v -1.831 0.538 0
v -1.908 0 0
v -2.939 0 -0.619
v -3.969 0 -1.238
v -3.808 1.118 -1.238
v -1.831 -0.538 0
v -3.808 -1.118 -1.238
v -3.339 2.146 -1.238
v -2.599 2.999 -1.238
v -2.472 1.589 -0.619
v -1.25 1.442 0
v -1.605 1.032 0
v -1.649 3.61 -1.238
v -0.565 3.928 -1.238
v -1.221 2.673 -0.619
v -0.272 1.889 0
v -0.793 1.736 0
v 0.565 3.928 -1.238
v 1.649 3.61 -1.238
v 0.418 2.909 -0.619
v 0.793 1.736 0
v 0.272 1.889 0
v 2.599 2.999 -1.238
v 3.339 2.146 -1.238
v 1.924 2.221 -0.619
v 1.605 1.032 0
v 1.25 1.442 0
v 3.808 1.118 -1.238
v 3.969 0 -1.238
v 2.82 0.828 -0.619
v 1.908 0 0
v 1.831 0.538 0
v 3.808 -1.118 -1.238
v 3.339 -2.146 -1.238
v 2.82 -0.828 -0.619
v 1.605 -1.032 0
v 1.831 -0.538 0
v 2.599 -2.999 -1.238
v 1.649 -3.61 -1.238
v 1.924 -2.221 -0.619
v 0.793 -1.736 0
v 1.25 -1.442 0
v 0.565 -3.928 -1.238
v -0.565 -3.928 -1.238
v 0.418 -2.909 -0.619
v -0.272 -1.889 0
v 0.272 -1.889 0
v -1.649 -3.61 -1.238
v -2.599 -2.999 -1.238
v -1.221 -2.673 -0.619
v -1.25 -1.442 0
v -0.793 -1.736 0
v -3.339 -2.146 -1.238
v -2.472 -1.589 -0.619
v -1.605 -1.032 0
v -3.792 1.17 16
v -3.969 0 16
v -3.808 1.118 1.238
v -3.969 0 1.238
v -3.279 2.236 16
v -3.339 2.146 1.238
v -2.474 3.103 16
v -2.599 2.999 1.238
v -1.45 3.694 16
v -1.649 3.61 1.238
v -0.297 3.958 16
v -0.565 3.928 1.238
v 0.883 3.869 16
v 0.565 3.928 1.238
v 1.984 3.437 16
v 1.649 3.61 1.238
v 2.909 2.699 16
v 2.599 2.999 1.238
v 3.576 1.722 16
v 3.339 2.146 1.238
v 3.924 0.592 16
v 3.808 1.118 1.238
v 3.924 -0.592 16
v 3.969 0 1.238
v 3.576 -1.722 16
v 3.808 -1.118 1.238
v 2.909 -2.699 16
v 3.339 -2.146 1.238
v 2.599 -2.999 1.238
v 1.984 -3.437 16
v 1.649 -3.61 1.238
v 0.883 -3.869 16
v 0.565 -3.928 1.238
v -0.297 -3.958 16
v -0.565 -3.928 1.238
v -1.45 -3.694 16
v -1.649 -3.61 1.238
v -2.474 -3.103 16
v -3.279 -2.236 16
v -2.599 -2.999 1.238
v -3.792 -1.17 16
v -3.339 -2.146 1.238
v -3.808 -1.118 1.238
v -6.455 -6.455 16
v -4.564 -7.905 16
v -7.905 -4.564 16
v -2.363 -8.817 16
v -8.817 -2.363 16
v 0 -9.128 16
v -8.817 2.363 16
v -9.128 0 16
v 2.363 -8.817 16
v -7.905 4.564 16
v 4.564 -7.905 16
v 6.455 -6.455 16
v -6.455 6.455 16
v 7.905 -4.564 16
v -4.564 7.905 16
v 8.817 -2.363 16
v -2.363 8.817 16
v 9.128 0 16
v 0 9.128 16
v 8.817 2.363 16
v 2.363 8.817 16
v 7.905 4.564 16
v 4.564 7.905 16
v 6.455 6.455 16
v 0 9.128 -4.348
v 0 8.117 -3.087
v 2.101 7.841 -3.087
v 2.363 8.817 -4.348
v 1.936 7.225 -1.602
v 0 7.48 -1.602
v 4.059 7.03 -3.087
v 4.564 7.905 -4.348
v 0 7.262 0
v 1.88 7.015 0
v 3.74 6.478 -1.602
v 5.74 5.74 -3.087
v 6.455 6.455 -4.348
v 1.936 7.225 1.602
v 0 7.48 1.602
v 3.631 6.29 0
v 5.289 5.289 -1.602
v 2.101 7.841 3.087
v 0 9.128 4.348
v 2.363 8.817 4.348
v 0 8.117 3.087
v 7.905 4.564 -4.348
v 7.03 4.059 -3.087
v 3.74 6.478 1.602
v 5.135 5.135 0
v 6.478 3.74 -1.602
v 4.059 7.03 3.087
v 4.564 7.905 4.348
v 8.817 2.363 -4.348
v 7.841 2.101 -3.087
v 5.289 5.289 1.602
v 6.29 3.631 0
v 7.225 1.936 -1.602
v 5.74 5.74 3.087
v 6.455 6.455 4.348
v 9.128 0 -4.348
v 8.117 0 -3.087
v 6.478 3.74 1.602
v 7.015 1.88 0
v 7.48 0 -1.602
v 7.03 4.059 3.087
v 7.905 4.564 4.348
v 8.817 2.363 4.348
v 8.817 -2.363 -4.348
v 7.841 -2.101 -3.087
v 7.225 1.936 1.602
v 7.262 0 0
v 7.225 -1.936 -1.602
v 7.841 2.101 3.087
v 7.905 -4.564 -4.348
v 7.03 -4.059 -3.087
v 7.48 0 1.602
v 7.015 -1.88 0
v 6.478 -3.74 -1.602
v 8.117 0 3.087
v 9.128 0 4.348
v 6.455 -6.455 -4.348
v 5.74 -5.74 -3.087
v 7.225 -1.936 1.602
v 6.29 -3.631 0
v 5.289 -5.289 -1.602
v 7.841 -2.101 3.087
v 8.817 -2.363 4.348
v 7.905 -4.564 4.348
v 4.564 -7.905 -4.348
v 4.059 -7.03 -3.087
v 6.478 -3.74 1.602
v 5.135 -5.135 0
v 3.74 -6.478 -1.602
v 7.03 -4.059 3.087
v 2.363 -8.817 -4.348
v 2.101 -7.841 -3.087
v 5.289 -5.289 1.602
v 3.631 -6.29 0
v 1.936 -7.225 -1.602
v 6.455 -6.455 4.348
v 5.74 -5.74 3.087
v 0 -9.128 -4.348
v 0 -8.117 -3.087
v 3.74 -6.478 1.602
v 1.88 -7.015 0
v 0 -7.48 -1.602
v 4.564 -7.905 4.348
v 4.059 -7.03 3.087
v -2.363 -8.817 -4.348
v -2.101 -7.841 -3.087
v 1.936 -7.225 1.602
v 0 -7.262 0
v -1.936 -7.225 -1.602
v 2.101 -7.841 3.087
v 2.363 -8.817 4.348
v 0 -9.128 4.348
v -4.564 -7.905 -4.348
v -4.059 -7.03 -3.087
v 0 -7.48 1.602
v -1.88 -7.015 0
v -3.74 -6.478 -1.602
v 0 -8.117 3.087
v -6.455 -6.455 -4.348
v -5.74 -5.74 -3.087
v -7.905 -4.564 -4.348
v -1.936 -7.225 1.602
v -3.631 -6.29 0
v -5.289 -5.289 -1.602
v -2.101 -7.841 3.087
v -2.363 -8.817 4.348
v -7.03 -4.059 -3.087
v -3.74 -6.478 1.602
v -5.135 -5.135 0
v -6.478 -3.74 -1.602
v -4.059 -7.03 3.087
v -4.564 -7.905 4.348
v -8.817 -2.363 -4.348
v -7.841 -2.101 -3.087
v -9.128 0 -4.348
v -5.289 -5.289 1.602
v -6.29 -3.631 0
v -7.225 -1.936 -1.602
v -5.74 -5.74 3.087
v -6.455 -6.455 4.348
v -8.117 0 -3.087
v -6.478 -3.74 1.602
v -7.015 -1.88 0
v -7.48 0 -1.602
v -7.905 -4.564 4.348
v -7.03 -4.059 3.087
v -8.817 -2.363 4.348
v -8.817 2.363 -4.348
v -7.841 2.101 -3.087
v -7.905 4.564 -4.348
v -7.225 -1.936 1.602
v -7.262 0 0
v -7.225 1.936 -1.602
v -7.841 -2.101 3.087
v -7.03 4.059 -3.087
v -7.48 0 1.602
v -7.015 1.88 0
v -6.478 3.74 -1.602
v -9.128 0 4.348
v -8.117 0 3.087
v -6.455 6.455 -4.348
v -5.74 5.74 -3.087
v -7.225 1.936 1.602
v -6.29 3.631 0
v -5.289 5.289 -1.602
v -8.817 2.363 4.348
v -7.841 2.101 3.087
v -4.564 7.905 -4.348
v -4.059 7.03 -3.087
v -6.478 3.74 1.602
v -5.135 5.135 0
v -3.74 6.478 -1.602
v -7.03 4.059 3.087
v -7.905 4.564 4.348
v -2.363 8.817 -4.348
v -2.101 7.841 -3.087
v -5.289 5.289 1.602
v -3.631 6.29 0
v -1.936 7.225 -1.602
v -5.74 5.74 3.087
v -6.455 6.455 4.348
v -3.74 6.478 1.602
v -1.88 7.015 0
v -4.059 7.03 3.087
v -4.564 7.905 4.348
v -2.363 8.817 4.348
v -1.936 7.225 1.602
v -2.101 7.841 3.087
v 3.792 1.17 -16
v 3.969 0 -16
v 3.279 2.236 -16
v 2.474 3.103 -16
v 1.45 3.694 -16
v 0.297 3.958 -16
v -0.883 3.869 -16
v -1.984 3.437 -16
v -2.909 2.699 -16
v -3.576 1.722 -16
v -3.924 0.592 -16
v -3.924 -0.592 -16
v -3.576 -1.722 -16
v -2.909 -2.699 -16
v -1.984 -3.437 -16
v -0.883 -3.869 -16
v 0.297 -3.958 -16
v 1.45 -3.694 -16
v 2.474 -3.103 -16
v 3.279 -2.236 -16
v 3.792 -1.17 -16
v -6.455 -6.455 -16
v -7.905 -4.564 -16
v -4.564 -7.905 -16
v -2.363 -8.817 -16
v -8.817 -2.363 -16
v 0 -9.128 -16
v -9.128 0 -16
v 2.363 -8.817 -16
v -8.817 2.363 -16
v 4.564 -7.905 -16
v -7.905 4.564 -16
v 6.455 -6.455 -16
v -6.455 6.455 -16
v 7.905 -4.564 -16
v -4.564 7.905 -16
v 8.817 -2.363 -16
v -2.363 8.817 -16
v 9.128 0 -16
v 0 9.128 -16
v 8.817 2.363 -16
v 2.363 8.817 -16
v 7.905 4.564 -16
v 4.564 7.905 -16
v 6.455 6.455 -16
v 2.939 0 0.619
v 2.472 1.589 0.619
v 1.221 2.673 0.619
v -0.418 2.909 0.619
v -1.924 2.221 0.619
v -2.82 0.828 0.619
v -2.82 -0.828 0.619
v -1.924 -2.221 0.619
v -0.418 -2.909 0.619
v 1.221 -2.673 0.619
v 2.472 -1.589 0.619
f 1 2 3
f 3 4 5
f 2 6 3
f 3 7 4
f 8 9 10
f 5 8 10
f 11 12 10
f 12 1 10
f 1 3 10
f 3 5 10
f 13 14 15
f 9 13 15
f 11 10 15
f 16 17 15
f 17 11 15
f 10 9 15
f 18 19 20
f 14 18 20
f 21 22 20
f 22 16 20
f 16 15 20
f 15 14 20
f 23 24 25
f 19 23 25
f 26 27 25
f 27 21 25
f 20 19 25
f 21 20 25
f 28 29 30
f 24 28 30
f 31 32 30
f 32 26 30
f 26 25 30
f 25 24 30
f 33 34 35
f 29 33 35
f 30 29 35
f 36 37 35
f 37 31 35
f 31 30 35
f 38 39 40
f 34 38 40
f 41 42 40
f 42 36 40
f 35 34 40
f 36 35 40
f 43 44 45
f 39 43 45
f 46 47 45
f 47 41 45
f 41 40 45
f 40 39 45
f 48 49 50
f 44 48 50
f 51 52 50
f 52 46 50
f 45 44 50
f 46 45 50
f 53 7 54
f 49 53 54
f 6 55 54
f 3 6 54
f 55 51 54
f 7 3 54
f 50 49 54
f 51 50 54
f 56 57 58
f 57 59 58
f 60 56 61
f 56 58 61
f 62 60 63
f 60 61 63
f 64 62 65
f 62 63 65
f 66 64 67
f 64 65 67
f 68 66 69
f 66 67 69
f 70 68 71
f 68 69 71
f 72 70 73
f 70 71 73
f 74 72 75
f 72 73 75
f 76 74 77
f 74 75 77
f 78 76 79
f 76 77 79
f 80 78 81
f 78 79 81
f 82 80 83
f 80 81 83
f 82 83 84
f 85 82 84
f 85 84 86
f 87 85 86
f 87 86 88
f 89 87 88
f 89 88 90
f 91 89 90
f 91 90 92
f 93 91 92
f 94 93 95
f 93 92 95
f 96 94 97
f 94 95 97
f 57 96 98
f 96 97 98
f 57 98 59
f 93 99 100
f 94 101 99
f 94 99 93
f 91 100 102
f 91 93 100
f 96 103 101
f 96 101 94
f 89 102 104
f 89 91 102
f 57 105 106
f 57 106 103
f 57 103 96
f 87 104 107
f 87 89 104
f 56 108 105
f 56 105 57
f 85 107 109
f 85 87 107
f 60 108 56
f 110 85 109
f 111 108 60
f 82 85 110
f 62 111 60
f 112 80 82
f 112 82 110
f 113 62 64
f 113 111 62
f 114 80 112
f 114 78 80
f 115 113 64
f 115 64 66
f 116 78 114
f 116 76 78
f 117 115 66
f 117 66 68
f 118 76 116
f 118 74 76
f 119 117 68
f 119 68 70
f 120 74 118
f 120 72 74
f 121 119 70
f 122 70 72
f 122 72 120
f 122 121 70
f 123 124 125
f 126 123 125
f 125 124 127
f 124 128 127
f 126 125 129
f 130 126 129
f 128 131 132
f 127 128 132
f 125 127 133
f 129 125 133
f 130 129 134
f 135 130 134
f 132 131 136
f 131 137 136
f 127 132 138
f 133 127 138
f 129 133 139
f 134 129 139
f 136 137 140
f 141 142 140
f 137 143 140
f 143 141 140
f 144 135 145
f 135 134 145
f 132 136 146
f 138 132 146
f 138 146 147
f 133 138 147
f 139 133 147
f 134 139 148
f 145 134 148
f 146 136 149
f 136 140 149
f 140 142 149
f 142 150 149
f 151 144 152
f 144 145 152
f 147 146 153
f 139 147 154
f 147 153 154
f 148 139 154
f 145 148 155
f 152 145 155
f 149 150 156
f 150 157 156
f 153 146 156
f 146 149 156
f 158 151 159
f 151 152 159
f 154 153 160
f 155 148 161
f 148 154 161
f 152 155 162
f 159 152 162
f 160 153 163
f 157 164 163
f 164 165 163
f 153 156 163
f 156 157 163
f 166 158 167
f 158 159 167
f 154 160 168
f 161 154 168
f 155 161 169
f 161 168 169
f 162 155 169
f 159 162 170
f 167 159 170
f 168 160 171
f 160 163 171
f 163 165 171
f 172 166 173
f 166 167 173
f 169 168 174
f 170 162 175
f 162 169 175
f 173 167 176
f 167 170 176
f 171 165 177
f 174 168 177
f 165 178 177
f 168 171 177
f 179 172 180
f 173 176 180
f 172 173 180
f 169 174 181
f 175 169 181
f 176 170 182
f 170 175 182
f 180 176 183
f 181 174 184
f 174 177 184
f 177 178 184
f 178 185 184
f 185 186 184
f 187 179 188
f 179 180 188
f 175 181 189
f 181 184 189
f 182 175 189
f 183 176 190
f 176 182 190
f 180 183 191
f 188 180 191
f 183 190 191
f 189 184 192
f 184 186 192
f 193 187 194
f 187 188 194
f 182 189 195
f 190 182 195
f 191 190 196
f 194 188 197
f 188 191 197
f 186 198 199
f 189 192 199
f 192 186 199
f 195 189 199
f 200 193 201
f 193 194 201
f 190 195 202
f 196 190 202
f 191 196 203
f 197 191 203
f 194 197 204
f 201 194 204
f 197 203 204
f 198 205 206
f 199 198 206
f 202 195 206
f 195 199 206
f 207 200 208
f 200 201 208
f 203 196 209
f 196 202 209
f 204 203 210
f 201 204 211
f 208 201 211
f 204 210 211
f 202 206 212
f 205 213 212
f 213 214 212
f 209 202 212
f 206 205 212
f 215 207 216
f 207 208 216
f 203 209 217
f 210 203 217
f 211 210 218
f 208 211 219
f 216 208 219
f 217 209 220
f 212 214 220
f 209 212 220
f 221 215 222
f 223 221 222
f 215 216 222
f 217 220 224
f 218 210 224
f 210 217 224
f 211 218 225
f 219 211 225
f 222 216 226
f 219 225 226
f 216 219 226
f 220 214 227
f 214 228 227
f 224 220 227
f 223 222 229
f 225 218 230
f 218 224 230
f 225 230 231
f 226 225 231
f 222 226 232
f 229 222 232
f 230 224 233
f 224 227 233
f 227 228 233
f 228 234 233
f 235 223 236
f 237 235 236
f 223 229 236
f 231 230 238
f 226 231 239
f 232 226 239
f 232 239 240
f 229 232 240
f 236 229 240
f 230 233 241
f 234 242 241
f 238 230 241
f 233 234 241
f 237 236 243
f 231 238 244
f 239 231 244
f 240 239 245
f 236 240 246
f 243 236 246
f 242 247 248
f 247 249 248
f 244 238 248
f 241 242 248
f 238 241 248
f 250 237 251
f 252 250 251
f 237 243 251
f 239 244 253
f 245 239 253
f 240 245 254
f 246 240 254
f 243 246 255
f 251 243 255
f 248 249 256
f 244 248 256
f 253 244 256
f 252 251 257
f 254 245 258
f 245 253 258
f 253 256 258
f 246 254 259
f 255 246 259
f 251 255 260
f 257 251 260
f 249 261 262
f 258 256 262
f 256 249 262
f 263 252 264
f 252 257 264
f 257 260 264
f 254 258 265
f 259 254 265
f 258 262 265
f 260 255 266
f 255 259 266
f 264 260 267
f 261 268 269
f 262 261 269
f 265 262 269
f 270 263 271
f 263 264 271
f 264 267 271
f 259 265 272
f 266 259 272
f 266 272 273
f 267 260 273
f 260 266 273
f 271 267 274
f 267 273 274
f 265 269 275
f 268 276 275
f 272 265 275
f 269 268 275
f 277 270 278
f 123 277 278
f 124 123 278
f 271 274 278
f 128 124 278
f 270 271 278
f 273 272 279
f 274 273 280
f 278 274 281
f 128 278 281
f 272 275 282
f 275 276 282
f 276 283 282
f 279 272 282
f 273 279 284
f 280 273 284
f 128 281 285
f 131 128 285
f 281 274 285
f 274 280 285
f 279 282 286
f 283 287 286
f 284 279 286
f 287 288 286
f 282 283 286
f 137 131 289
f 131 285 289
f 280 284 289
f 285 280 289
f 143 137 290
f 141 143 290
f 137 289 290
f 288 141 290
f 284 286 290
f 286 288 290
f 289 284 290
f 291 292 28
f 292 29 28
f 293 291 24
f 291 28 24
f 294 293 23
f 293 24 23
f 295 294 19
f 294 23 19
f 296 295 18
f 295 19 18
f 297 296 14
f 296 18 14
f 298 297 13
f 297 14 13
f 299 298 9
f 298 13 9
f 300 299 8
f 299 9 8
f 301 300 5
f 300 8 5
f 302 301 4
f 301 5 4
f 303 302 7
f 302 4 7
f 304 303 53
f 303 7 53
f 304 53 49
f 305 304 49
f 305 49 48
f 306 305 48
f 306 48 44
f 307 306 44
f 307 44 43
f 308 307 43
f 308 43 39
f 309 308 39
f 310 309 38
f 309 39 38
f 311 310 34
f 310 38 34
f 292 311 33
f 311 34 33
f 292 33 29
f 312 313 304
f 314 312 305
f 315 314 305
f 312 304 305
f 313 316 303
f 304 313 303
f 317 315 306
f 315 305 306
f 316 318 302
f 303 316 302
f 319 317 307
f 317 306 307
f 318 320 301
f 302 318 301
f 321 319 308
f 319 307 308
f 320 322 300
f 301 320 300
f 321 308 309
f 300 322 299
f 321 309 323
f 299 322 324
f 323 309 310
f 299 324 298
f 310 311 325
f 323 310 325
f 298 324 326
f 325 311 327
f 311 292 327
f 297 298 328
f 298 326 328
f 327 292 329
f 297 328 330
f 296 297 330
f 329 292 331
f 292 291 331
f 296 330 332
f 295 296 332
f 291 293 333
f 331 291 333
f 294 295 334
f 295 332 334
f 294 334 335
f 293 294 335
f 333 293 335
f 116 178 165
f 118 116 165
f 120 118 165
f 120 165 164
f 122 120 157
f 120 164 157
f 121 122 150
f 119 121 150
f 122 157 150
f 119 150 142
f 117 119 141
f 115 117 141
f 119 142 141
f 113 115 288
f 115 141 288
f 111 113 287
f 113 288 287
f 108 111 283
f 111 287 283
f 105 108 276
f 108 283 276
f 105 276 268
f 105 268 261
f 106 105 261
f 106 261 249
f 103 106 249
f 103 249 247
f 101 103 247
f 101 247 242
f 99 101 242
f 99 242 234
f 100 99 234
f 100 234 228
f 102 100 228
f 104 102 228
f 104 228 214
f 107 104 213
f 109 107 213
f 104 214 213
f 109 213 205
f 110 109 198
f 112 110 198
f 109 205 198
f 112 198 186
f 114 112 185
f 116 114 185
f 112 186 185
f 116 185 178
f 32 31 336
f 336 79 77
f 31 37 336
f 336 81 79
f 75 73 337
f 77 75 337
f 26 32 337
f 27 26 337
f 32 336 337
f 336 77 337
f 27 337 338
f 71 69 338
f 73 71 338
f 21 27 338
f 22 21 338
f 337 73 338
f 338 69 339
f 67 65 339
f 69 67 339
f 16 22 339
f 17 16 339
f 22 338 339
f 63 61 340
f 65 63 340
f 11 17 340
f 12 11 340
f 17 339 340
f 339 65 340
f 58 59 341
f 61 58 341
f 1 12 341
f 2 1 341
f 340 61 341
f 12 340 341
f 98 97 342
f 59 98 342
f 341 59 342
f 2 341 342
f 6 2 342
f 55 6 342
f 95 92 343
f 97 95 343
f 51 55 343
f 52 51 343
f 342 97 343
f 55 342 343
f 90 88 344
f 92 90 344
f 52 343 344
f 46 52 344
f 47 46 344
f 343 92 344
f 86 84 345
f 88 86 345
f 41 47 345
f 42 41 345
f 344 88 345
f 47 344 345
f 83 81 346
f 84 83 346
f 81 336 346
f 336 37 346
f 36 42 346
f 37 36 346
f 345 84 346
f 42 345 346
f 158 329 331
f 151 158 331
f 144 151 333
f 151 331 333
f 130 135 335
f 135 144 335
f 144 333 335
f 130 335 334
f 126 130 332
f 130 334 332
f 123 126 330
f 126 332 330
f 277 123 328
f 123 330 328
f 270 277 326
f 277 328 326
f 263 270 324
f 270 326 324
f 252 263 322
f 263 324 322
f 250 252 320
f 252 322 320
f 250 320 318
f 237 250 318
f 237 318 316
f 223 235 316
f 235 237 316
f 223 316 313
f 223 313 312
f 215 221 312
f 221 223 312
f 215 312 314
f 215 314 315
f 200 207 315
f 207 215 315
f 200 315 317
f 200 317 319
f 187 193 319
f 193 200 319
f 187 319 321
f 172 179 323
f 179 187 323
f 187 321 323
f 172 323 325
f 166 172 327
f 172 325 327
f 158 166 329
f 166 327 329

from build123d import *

# Parameters (mm, degrees)
EXTRUDE1_START              = -16
SKETCH1_R                   = 9.128125
EXTRUDE1_DEPTH              = 32
F_3_8_16_TAPPED_HOLE3_D     = 7.9375
F_3_8_16_TAPPED_HOLE3_DEPTH = 14.762
F_3_8_16_TAPPED_HOLE3_TIP   = 2.384665582
F_3_8_16_TAPPED_HOLE4_D     = 7.9375
F_3_8_16_TAPPED_HOLE4_DEPTH = 14.762
F_3_8_16_TAPPED_HOLE4_TIP   = 2.384665582


with BuildPart() as part:
    # Sketch1 → Extrude1 (new body)
    with BuildSketch(Plane.XY.offset(EXTRUDE1_START)):
        Circle(SKETCH1_R)
    extrude(amount=EXTRUDE1_DEPTH)

    # Sketch2 → Cut-Revolve1 (revolve, cut)
    with BuildSketch(Plane(origin=(0, 0, 0), x_dir=(0, 0, -1), z_dir=(1, 0, 0))):
        with BuildLine():
            Line((-6, 13.2625), (-6, 15.153312549))
            Line((-6, 15.153312549), (6, 15.153312549))
            Line((6, 15.153312549), (6, 13.2625))
            ThreePointArc((6, 13.2625), (0, 7.2625), (-6, 13.2625))
        make_face()
    revolve(axis=Axis((0, 0, 16), (0, 0, -1)), mode=Mode.SUBTRACT)

    # 3_8-16 Tapped Hole3
    with Locations(Plane.XY.offset(16)):
        with Locations((0, 0)):
            Hole(F_3_8_16_TAPPED_HOLE3_D / 2, depth=F_3_8_16_TAPPED_HOLE3_DEPTH)
            with Locations((0, 0, -(F_3_8_16_TAPPED_HOLE3_DEPTH + F_3_8_16_TAPPED_HOLE3_TIP / 2))):  # 118° drill point
                Cone(0, F_3_8_16_TAPPED_HOLE3_D / 2, F_3_8_16_TAPPED_HOLE3_TIP, mode=Mode.SUBTRACT)

    # 3_8-16 Tapped Hole4
    with Locations(Plane(origin=(0, 0, -16), x_dir=(-1, 0, 0), z_dir=(0, 0, -1))):
        with Locations((0, 0)):
            Hole(F_3_8_16_TAPPED_HOLE4_D / 2, depth=F_3_8_16_TAPPED_HOLE4_DEPTH)
            with Locations((0, 0, -(F_3_8_16_TAPPED_HOLE4_DEPTH + F_3_8_16_TAPPED_HOLE4_TIP / 2))):  # 118° drill point
                Cone(0, F_3_8_16_TAPPED_HOLE4_D / 2, F_3_8_16_TAPPED_HOLE4_TIP, mode=Mode.SUBTRACT)


solid = part.part
